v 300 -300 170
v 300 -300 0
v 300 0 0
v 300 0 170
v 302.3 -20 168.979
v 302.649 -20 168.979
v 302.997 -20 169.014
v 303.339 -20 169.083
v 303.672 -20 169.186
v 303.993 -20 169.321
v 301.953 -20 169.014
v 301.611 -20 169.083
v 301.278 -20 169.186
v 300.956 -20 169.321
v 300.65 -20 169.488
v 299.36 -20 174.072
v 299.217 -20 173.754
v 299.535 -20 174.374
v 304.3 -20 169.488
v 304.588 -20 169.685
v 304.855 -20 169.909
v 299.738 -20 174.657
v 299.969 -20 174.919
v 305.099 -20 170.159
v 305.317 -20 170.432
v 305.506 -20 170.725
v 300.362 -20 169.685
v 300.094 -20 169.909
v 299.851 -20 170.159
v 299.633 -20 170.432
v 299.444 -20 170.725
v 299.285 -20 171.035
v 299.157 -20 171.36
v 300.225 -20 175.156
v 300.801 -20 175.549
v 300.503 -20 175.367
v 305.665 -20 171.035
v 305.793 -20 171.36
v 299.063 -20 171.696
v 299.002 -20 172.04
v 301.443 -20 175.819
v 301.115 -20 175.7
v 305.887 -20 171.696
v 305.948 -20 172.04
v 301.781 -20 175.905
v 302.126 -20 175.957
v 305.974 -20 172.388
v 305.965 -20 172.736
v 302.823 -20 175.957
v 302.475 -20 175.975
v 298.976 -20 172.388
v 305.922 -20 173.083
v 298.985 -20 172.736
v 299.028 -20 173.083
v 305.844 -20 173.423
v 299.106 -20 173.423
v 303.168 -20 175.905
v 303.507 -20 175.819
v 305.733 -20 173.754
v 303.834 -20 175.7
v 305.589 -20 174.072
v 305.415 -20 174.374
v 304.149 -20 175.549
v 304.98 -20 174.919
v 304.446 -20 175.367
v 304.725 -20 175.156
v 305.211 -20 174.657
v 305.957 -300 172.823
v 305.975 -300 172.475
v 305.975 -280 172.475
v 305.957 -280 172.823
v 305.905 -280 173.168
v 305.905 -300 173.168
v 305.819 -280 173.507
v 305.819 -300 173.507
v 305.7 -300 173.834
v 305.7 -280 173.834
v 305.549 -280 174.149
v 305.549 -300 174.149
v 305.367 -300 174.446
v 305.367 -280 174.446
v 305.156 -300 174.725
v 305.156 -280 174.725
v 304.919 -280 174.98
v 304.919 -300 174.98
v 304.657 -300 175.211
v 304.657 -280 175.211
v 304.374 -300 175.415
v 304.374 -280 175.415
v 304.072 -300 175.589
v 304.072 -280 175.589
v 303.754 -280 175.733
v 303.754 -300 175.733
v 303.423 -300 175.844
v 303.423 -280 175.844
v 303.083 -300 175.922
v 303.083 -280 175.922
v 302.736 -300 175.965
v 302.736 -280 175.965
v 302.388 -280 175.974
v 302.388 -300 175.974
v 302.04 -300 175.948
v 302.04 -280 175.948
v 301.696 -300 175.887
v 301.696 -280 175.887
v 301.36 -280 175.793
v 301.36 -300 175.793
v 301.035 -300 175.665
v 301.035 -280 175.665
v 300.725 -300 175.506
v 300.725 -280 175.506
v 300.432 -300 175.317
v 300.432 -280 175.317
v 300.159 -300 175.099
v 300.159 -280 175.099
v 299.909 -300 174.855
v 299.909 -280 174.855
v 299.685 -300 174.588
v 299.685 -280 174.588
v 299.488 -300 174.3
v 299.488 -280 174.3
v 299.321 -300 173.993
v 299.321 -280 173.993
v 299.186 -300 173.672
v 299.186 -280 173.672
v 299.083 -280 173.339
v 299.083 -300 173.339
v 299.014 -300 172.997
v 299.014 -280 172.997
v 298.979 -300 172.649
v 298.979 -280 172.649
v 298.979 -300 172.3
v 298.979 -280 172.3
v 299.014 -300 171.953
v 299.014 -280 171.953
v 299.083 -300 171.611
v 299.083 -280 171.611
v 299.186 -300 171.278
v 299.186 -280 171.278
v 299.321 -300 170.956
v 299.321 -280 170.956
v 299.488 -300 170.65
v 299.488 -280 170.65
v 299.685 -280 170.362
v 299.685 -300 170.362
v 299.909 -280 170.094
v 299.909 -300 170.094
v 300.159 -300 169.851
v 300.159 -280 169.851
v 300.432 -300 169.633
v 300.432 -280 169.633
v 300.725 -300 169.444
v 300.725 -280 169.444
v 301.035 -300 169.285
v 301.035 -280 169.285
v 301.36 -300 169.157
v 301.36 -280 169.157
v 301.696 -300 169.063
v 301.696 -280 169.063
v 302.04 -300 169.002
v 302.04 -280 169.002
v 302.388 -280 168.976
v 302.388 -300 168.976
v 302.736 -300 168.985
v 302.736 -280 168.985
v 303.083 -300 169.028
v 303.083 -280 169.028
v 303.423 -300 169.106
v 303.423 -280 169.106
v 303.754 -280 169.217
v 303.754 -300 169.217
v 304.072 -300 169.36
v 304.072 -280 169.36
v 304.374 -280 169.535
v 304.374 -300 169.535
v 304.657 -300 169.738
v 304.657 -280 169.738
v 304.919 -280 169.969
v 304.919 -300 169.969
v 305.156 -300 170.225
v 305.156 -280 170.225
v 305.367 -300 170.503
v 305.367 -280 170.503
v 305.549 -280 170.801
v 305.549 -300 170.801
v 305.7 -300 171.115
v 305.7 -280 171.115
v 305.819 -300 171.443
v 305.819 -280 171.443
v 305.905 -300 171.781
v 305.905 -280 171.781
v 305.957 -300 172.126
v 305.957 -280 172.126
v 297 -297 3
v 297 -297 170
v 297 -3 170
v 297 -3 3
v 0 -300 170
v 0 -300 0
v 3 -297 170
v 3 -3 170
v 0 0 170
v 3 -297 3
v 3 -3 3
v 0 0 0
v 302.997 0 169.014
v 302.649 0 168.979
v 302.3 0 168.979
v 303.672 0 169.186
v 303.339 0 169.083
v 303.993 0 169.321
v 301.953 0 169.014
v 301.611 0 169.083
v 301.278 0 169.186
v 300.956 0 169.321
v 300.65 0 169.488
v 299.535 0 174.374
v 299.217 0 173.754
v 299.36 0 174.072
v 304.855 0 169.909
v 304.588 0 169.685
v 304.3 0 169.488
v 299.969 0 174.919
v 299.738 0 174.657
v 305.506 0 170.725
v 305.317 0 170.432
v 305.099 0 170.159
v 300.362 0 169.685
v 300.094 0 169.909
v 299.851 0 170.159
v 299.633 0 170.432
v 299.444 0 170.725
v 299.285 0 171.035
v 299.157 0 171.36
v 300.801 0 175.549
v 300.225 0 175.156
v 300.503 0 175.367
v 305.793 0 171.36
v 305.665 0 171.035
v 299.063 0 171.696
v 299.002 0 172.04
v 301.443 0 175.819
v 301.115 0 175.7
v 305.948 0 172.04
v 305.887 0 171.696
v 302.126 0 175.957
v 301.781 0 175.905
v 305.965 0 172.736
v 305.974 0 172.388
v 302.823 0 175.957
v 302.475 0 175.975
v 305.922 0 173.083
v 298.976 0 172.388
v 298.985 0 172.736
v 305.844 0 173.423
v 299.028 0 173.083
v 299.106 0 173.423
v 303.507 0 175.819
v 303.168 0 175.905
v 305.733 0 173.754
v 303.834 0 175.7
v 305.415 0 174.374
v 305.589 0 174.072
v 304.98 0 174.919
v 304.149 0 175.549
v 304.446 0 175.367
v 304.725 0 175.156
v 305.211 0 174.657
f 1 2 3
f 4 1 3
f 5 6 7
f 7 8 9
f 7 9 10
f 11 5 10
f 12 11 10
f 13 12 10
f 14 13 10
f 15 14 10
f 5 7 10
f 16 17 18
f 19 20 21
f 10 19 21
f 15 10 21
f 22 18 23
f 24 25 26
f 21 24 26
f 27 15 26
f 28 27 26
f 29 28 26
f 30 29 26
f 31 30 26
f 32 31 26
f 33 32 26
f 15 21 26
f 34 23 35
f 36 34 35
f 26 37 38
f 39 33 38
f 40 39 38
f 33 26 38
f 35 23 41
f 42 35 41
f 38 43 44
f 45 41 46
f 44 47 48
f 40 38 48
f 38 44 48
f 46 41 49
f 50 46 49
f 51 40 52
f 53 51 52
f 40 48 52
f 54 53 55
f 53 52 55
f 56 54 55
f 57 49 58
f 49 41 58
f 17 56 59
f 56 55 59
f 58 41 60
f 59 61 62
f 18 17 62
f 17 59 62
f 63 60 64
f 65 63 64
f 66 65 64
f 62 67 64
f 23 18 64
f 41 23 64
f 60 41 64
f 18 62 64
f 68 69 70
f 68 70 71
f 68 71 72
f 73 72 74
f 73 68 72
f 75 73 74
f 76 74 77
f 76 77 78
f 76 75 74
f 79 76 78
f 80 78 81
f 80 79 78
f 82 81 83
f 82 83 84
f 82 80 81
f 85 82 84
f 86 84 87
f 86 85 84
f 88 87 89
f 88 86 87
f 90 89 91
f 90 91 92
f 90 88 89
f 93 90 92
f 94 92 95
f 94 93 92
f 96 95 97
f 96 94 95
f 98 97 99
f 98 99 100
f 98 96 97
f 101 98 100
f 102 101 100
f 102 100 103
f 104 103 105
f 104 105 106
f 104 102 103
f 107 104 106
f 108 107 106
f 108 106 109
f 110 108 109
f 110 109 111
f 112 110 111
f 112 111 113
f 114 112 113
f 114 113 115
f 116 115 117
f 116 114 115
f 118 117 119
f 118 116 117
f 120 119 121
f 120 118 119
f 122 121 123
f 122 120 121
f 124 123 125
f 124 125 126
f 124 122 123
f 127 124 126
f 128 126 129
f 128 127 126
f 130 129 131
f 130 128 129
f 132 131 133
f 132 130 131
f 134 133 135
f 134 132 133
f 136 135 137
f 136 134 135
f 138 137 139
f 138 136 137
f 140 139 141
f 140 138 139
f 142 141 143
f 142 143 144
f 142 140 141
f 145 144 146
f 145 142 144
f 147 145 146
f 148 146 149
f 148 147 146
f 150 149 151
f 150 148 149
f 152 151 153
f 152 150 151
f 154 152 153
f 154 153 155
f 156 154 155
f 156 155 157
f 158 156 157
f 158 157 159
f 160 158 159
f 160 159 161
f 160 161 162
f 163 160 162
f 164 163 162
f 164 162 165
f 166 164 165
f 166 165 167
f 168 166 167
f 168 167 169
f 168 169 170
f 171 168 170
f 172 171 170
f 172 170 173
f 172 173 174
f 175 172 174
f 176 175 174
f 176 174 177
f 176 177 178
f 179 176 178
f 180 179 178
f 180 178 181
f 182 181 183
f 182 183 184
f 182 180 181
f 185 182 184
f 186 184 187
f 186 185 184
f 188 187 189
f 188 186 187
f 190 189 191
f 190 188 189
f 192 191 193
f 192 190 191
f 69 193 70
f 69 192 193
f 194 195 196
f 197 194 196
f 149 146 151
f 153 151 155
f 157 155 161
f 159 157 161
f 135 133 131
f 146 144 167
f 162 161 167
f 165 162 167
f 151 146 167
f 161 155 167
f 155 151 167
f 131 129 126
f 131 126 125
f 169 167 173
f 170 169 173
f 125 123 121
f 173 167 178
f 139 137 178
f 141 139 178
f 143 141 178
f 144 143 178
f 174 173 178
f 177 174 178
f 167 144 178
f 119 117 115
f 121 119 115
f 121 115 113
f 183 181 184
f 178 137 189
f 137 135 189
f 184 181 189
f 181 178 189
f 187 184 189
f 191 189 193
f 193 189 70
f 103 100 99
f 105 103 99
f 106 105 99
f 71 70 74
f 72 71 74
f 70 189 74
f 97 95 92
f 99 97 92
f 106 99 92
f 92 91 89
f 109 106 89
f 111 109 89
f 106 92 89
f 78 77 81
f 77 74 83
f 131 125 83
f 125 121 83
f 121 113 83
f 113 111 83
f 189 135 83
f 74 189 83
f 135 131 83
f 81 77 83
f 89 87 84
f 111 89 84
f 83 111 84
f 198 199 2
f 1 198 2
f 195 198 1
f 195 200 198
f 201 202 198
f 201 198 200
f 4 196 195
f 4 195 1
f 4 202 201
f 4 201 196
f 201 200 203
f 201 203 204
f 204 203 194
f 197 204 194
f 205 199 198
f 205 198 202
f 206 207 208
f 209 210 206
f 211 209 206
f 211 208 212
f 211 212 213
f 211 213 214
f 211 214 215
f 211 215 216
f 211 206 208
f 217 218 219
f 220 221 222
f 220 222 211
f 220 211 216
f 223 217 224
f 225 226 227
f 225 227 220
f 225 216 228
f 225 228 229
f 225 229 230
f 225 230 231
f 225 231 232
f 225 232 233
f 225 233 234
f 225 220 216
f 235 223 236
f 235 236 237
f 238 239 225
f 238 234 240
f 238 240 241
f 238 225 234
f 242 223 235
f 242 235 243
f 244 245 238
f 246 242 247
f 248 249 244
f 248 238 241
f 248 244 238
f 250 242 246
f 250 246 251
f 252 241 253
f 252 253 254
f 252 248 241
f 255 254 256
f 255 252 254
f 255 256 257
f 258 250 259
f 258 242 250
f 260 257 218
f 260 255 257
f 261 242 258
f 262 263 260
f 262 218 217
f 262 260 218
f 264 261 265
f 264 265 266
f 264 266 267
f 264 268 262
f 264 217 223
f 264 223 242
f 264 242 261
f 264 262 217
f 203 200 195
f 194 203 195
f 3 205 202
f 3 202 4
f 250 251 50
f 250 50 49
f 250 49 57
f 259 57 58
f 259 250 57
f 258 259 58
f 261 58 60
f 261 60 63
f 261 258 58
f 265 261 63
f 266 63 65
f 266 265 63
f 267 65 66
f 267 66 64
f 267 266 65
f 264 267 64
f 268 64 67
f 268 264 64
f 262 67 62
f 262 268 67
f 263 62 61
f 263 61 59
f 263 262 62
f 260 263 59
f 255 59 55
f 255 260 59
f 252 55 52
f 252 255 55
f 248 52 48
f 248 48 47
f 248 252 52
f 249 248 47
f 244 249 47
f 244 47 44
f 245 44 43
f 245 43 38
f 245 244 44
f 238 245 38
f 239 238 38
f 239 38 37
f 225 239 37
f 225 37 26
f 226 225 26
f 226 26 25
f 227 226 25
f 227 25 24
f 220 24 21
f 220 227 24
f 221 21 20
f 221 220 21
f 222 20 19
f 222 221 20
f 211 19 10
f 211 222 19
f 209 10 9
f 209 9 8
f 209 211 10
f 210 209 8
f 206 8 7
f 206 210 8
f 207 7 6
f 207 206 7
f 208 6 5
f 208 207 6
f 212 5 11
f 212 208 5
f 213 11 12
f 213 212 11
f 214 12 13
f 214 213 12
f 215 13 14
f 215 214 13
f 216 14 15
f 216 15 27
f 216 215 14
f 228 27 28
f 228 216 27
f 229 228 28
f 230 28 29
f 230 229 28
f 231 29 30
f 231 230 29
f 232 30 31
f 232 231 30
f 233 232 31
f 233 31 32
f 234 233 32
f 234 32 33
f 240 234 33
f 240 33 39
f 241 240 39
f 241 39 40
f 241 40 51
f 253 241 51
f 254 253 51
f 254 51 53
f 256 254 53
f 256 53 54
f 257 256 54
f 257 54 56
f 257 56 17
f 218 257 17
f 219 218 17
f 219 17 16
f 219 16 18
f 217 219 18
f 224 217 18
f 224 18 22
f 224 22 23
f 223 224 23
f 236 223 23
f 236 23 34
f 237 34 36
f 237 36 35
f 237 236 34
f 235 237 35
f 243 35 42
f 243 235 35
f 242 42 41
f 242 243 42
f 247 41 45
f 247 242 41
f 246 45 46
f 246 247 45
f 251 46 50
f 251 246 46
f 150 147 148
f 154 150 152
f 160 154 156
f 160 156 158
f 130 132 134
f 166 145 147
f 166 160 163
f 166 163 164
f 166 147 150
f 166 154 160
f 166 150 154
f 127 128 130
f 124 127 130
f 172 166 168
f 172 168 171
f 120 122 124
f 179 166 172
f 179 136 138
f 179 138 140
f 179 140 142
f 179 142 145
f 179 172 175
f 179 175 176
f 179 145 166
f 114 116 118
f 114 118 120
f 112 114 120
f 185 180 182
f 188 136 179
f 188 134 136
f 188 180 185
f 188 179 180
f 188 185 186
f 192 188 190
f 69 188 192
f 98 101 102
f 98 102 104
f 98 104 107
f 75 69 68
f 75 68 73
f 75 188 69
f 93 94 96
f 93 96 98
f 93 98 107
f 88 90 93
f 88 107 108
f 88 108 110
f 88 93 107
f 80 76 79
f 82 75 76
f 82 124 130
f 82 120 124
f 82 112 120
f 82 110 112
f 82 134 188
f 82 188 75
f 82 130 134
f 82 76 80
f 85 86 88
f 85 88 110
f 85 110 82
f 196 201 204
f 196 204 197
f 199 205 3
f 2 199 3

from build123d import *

# Parameters (mm, degrees)
CROQUIS1_W              = 300
CROQUIS1_H              = 300
SALIENTE_EXTRUIR1_DEPTH = 170
CROQUIS2_W              = 294
CROQUIS2_H              = 294
CORTAR_EXTRUIR1_DEPTH   = 167
CROQUIS3_R              = 3.5
SALIENTE_EXTRUIR2_DEPTH = 20
CROQUIS4_R              = 3.5
SALIENTE_EXTRUIR3_DEPTH = 20


with BuildPart() as part:
    # Croquis1 → Saliente-Extruir1 (new body)
    with BuildSketch(Plane.XY):
        with Locations((150, -150)):
            Rectangle(CROQUIS1_W, CROQUIS1_H)
    extrude(amount=SALIENTE_EXTRUIR1_DEPTH)

    # Croquis2 → Cortar-Extruir1 (cut)
    with BuildSketch(Plane.XY.offset(170)):
        with Locations((150, -150)):
            Rectangle(CROQUIS2_W, CROQUIS2_H)
    extrude(amount=-CORTAR_EXTRUIR1_DEPTH, mode=Mode.SUBTRACT)


with BuildPart() as body_2:
    # Croquis3 → Saliente-Extruir2 (new body)
    with BuildSketch(Plane(origin=(0, 0, 0), x_dir=(1, 0, 0), z_dir=(0, 1, 0))):
        with Locations(Location((302.474873734, -172.474873734, 0), (0, 0, 270))):
            Circle(CROQUIS3_R)
    extrude(amount=-SALIENTE_EXTRUIR2_DEPTH)


with BuildPart() as body_3:
    # Croquis4 → Saliente-Extruir3 (new body)
    with BuildSketch(Plane.XZ.offset(300)):
        with Locations((302.474873734, 172.474873734)):
            Circle(CROQUIS4_R)
    extrude(amount=-SALIENTE_EXTRUIR3_DEPTH)


solid = Compound([part.part, body_2.part, body_3.part])
